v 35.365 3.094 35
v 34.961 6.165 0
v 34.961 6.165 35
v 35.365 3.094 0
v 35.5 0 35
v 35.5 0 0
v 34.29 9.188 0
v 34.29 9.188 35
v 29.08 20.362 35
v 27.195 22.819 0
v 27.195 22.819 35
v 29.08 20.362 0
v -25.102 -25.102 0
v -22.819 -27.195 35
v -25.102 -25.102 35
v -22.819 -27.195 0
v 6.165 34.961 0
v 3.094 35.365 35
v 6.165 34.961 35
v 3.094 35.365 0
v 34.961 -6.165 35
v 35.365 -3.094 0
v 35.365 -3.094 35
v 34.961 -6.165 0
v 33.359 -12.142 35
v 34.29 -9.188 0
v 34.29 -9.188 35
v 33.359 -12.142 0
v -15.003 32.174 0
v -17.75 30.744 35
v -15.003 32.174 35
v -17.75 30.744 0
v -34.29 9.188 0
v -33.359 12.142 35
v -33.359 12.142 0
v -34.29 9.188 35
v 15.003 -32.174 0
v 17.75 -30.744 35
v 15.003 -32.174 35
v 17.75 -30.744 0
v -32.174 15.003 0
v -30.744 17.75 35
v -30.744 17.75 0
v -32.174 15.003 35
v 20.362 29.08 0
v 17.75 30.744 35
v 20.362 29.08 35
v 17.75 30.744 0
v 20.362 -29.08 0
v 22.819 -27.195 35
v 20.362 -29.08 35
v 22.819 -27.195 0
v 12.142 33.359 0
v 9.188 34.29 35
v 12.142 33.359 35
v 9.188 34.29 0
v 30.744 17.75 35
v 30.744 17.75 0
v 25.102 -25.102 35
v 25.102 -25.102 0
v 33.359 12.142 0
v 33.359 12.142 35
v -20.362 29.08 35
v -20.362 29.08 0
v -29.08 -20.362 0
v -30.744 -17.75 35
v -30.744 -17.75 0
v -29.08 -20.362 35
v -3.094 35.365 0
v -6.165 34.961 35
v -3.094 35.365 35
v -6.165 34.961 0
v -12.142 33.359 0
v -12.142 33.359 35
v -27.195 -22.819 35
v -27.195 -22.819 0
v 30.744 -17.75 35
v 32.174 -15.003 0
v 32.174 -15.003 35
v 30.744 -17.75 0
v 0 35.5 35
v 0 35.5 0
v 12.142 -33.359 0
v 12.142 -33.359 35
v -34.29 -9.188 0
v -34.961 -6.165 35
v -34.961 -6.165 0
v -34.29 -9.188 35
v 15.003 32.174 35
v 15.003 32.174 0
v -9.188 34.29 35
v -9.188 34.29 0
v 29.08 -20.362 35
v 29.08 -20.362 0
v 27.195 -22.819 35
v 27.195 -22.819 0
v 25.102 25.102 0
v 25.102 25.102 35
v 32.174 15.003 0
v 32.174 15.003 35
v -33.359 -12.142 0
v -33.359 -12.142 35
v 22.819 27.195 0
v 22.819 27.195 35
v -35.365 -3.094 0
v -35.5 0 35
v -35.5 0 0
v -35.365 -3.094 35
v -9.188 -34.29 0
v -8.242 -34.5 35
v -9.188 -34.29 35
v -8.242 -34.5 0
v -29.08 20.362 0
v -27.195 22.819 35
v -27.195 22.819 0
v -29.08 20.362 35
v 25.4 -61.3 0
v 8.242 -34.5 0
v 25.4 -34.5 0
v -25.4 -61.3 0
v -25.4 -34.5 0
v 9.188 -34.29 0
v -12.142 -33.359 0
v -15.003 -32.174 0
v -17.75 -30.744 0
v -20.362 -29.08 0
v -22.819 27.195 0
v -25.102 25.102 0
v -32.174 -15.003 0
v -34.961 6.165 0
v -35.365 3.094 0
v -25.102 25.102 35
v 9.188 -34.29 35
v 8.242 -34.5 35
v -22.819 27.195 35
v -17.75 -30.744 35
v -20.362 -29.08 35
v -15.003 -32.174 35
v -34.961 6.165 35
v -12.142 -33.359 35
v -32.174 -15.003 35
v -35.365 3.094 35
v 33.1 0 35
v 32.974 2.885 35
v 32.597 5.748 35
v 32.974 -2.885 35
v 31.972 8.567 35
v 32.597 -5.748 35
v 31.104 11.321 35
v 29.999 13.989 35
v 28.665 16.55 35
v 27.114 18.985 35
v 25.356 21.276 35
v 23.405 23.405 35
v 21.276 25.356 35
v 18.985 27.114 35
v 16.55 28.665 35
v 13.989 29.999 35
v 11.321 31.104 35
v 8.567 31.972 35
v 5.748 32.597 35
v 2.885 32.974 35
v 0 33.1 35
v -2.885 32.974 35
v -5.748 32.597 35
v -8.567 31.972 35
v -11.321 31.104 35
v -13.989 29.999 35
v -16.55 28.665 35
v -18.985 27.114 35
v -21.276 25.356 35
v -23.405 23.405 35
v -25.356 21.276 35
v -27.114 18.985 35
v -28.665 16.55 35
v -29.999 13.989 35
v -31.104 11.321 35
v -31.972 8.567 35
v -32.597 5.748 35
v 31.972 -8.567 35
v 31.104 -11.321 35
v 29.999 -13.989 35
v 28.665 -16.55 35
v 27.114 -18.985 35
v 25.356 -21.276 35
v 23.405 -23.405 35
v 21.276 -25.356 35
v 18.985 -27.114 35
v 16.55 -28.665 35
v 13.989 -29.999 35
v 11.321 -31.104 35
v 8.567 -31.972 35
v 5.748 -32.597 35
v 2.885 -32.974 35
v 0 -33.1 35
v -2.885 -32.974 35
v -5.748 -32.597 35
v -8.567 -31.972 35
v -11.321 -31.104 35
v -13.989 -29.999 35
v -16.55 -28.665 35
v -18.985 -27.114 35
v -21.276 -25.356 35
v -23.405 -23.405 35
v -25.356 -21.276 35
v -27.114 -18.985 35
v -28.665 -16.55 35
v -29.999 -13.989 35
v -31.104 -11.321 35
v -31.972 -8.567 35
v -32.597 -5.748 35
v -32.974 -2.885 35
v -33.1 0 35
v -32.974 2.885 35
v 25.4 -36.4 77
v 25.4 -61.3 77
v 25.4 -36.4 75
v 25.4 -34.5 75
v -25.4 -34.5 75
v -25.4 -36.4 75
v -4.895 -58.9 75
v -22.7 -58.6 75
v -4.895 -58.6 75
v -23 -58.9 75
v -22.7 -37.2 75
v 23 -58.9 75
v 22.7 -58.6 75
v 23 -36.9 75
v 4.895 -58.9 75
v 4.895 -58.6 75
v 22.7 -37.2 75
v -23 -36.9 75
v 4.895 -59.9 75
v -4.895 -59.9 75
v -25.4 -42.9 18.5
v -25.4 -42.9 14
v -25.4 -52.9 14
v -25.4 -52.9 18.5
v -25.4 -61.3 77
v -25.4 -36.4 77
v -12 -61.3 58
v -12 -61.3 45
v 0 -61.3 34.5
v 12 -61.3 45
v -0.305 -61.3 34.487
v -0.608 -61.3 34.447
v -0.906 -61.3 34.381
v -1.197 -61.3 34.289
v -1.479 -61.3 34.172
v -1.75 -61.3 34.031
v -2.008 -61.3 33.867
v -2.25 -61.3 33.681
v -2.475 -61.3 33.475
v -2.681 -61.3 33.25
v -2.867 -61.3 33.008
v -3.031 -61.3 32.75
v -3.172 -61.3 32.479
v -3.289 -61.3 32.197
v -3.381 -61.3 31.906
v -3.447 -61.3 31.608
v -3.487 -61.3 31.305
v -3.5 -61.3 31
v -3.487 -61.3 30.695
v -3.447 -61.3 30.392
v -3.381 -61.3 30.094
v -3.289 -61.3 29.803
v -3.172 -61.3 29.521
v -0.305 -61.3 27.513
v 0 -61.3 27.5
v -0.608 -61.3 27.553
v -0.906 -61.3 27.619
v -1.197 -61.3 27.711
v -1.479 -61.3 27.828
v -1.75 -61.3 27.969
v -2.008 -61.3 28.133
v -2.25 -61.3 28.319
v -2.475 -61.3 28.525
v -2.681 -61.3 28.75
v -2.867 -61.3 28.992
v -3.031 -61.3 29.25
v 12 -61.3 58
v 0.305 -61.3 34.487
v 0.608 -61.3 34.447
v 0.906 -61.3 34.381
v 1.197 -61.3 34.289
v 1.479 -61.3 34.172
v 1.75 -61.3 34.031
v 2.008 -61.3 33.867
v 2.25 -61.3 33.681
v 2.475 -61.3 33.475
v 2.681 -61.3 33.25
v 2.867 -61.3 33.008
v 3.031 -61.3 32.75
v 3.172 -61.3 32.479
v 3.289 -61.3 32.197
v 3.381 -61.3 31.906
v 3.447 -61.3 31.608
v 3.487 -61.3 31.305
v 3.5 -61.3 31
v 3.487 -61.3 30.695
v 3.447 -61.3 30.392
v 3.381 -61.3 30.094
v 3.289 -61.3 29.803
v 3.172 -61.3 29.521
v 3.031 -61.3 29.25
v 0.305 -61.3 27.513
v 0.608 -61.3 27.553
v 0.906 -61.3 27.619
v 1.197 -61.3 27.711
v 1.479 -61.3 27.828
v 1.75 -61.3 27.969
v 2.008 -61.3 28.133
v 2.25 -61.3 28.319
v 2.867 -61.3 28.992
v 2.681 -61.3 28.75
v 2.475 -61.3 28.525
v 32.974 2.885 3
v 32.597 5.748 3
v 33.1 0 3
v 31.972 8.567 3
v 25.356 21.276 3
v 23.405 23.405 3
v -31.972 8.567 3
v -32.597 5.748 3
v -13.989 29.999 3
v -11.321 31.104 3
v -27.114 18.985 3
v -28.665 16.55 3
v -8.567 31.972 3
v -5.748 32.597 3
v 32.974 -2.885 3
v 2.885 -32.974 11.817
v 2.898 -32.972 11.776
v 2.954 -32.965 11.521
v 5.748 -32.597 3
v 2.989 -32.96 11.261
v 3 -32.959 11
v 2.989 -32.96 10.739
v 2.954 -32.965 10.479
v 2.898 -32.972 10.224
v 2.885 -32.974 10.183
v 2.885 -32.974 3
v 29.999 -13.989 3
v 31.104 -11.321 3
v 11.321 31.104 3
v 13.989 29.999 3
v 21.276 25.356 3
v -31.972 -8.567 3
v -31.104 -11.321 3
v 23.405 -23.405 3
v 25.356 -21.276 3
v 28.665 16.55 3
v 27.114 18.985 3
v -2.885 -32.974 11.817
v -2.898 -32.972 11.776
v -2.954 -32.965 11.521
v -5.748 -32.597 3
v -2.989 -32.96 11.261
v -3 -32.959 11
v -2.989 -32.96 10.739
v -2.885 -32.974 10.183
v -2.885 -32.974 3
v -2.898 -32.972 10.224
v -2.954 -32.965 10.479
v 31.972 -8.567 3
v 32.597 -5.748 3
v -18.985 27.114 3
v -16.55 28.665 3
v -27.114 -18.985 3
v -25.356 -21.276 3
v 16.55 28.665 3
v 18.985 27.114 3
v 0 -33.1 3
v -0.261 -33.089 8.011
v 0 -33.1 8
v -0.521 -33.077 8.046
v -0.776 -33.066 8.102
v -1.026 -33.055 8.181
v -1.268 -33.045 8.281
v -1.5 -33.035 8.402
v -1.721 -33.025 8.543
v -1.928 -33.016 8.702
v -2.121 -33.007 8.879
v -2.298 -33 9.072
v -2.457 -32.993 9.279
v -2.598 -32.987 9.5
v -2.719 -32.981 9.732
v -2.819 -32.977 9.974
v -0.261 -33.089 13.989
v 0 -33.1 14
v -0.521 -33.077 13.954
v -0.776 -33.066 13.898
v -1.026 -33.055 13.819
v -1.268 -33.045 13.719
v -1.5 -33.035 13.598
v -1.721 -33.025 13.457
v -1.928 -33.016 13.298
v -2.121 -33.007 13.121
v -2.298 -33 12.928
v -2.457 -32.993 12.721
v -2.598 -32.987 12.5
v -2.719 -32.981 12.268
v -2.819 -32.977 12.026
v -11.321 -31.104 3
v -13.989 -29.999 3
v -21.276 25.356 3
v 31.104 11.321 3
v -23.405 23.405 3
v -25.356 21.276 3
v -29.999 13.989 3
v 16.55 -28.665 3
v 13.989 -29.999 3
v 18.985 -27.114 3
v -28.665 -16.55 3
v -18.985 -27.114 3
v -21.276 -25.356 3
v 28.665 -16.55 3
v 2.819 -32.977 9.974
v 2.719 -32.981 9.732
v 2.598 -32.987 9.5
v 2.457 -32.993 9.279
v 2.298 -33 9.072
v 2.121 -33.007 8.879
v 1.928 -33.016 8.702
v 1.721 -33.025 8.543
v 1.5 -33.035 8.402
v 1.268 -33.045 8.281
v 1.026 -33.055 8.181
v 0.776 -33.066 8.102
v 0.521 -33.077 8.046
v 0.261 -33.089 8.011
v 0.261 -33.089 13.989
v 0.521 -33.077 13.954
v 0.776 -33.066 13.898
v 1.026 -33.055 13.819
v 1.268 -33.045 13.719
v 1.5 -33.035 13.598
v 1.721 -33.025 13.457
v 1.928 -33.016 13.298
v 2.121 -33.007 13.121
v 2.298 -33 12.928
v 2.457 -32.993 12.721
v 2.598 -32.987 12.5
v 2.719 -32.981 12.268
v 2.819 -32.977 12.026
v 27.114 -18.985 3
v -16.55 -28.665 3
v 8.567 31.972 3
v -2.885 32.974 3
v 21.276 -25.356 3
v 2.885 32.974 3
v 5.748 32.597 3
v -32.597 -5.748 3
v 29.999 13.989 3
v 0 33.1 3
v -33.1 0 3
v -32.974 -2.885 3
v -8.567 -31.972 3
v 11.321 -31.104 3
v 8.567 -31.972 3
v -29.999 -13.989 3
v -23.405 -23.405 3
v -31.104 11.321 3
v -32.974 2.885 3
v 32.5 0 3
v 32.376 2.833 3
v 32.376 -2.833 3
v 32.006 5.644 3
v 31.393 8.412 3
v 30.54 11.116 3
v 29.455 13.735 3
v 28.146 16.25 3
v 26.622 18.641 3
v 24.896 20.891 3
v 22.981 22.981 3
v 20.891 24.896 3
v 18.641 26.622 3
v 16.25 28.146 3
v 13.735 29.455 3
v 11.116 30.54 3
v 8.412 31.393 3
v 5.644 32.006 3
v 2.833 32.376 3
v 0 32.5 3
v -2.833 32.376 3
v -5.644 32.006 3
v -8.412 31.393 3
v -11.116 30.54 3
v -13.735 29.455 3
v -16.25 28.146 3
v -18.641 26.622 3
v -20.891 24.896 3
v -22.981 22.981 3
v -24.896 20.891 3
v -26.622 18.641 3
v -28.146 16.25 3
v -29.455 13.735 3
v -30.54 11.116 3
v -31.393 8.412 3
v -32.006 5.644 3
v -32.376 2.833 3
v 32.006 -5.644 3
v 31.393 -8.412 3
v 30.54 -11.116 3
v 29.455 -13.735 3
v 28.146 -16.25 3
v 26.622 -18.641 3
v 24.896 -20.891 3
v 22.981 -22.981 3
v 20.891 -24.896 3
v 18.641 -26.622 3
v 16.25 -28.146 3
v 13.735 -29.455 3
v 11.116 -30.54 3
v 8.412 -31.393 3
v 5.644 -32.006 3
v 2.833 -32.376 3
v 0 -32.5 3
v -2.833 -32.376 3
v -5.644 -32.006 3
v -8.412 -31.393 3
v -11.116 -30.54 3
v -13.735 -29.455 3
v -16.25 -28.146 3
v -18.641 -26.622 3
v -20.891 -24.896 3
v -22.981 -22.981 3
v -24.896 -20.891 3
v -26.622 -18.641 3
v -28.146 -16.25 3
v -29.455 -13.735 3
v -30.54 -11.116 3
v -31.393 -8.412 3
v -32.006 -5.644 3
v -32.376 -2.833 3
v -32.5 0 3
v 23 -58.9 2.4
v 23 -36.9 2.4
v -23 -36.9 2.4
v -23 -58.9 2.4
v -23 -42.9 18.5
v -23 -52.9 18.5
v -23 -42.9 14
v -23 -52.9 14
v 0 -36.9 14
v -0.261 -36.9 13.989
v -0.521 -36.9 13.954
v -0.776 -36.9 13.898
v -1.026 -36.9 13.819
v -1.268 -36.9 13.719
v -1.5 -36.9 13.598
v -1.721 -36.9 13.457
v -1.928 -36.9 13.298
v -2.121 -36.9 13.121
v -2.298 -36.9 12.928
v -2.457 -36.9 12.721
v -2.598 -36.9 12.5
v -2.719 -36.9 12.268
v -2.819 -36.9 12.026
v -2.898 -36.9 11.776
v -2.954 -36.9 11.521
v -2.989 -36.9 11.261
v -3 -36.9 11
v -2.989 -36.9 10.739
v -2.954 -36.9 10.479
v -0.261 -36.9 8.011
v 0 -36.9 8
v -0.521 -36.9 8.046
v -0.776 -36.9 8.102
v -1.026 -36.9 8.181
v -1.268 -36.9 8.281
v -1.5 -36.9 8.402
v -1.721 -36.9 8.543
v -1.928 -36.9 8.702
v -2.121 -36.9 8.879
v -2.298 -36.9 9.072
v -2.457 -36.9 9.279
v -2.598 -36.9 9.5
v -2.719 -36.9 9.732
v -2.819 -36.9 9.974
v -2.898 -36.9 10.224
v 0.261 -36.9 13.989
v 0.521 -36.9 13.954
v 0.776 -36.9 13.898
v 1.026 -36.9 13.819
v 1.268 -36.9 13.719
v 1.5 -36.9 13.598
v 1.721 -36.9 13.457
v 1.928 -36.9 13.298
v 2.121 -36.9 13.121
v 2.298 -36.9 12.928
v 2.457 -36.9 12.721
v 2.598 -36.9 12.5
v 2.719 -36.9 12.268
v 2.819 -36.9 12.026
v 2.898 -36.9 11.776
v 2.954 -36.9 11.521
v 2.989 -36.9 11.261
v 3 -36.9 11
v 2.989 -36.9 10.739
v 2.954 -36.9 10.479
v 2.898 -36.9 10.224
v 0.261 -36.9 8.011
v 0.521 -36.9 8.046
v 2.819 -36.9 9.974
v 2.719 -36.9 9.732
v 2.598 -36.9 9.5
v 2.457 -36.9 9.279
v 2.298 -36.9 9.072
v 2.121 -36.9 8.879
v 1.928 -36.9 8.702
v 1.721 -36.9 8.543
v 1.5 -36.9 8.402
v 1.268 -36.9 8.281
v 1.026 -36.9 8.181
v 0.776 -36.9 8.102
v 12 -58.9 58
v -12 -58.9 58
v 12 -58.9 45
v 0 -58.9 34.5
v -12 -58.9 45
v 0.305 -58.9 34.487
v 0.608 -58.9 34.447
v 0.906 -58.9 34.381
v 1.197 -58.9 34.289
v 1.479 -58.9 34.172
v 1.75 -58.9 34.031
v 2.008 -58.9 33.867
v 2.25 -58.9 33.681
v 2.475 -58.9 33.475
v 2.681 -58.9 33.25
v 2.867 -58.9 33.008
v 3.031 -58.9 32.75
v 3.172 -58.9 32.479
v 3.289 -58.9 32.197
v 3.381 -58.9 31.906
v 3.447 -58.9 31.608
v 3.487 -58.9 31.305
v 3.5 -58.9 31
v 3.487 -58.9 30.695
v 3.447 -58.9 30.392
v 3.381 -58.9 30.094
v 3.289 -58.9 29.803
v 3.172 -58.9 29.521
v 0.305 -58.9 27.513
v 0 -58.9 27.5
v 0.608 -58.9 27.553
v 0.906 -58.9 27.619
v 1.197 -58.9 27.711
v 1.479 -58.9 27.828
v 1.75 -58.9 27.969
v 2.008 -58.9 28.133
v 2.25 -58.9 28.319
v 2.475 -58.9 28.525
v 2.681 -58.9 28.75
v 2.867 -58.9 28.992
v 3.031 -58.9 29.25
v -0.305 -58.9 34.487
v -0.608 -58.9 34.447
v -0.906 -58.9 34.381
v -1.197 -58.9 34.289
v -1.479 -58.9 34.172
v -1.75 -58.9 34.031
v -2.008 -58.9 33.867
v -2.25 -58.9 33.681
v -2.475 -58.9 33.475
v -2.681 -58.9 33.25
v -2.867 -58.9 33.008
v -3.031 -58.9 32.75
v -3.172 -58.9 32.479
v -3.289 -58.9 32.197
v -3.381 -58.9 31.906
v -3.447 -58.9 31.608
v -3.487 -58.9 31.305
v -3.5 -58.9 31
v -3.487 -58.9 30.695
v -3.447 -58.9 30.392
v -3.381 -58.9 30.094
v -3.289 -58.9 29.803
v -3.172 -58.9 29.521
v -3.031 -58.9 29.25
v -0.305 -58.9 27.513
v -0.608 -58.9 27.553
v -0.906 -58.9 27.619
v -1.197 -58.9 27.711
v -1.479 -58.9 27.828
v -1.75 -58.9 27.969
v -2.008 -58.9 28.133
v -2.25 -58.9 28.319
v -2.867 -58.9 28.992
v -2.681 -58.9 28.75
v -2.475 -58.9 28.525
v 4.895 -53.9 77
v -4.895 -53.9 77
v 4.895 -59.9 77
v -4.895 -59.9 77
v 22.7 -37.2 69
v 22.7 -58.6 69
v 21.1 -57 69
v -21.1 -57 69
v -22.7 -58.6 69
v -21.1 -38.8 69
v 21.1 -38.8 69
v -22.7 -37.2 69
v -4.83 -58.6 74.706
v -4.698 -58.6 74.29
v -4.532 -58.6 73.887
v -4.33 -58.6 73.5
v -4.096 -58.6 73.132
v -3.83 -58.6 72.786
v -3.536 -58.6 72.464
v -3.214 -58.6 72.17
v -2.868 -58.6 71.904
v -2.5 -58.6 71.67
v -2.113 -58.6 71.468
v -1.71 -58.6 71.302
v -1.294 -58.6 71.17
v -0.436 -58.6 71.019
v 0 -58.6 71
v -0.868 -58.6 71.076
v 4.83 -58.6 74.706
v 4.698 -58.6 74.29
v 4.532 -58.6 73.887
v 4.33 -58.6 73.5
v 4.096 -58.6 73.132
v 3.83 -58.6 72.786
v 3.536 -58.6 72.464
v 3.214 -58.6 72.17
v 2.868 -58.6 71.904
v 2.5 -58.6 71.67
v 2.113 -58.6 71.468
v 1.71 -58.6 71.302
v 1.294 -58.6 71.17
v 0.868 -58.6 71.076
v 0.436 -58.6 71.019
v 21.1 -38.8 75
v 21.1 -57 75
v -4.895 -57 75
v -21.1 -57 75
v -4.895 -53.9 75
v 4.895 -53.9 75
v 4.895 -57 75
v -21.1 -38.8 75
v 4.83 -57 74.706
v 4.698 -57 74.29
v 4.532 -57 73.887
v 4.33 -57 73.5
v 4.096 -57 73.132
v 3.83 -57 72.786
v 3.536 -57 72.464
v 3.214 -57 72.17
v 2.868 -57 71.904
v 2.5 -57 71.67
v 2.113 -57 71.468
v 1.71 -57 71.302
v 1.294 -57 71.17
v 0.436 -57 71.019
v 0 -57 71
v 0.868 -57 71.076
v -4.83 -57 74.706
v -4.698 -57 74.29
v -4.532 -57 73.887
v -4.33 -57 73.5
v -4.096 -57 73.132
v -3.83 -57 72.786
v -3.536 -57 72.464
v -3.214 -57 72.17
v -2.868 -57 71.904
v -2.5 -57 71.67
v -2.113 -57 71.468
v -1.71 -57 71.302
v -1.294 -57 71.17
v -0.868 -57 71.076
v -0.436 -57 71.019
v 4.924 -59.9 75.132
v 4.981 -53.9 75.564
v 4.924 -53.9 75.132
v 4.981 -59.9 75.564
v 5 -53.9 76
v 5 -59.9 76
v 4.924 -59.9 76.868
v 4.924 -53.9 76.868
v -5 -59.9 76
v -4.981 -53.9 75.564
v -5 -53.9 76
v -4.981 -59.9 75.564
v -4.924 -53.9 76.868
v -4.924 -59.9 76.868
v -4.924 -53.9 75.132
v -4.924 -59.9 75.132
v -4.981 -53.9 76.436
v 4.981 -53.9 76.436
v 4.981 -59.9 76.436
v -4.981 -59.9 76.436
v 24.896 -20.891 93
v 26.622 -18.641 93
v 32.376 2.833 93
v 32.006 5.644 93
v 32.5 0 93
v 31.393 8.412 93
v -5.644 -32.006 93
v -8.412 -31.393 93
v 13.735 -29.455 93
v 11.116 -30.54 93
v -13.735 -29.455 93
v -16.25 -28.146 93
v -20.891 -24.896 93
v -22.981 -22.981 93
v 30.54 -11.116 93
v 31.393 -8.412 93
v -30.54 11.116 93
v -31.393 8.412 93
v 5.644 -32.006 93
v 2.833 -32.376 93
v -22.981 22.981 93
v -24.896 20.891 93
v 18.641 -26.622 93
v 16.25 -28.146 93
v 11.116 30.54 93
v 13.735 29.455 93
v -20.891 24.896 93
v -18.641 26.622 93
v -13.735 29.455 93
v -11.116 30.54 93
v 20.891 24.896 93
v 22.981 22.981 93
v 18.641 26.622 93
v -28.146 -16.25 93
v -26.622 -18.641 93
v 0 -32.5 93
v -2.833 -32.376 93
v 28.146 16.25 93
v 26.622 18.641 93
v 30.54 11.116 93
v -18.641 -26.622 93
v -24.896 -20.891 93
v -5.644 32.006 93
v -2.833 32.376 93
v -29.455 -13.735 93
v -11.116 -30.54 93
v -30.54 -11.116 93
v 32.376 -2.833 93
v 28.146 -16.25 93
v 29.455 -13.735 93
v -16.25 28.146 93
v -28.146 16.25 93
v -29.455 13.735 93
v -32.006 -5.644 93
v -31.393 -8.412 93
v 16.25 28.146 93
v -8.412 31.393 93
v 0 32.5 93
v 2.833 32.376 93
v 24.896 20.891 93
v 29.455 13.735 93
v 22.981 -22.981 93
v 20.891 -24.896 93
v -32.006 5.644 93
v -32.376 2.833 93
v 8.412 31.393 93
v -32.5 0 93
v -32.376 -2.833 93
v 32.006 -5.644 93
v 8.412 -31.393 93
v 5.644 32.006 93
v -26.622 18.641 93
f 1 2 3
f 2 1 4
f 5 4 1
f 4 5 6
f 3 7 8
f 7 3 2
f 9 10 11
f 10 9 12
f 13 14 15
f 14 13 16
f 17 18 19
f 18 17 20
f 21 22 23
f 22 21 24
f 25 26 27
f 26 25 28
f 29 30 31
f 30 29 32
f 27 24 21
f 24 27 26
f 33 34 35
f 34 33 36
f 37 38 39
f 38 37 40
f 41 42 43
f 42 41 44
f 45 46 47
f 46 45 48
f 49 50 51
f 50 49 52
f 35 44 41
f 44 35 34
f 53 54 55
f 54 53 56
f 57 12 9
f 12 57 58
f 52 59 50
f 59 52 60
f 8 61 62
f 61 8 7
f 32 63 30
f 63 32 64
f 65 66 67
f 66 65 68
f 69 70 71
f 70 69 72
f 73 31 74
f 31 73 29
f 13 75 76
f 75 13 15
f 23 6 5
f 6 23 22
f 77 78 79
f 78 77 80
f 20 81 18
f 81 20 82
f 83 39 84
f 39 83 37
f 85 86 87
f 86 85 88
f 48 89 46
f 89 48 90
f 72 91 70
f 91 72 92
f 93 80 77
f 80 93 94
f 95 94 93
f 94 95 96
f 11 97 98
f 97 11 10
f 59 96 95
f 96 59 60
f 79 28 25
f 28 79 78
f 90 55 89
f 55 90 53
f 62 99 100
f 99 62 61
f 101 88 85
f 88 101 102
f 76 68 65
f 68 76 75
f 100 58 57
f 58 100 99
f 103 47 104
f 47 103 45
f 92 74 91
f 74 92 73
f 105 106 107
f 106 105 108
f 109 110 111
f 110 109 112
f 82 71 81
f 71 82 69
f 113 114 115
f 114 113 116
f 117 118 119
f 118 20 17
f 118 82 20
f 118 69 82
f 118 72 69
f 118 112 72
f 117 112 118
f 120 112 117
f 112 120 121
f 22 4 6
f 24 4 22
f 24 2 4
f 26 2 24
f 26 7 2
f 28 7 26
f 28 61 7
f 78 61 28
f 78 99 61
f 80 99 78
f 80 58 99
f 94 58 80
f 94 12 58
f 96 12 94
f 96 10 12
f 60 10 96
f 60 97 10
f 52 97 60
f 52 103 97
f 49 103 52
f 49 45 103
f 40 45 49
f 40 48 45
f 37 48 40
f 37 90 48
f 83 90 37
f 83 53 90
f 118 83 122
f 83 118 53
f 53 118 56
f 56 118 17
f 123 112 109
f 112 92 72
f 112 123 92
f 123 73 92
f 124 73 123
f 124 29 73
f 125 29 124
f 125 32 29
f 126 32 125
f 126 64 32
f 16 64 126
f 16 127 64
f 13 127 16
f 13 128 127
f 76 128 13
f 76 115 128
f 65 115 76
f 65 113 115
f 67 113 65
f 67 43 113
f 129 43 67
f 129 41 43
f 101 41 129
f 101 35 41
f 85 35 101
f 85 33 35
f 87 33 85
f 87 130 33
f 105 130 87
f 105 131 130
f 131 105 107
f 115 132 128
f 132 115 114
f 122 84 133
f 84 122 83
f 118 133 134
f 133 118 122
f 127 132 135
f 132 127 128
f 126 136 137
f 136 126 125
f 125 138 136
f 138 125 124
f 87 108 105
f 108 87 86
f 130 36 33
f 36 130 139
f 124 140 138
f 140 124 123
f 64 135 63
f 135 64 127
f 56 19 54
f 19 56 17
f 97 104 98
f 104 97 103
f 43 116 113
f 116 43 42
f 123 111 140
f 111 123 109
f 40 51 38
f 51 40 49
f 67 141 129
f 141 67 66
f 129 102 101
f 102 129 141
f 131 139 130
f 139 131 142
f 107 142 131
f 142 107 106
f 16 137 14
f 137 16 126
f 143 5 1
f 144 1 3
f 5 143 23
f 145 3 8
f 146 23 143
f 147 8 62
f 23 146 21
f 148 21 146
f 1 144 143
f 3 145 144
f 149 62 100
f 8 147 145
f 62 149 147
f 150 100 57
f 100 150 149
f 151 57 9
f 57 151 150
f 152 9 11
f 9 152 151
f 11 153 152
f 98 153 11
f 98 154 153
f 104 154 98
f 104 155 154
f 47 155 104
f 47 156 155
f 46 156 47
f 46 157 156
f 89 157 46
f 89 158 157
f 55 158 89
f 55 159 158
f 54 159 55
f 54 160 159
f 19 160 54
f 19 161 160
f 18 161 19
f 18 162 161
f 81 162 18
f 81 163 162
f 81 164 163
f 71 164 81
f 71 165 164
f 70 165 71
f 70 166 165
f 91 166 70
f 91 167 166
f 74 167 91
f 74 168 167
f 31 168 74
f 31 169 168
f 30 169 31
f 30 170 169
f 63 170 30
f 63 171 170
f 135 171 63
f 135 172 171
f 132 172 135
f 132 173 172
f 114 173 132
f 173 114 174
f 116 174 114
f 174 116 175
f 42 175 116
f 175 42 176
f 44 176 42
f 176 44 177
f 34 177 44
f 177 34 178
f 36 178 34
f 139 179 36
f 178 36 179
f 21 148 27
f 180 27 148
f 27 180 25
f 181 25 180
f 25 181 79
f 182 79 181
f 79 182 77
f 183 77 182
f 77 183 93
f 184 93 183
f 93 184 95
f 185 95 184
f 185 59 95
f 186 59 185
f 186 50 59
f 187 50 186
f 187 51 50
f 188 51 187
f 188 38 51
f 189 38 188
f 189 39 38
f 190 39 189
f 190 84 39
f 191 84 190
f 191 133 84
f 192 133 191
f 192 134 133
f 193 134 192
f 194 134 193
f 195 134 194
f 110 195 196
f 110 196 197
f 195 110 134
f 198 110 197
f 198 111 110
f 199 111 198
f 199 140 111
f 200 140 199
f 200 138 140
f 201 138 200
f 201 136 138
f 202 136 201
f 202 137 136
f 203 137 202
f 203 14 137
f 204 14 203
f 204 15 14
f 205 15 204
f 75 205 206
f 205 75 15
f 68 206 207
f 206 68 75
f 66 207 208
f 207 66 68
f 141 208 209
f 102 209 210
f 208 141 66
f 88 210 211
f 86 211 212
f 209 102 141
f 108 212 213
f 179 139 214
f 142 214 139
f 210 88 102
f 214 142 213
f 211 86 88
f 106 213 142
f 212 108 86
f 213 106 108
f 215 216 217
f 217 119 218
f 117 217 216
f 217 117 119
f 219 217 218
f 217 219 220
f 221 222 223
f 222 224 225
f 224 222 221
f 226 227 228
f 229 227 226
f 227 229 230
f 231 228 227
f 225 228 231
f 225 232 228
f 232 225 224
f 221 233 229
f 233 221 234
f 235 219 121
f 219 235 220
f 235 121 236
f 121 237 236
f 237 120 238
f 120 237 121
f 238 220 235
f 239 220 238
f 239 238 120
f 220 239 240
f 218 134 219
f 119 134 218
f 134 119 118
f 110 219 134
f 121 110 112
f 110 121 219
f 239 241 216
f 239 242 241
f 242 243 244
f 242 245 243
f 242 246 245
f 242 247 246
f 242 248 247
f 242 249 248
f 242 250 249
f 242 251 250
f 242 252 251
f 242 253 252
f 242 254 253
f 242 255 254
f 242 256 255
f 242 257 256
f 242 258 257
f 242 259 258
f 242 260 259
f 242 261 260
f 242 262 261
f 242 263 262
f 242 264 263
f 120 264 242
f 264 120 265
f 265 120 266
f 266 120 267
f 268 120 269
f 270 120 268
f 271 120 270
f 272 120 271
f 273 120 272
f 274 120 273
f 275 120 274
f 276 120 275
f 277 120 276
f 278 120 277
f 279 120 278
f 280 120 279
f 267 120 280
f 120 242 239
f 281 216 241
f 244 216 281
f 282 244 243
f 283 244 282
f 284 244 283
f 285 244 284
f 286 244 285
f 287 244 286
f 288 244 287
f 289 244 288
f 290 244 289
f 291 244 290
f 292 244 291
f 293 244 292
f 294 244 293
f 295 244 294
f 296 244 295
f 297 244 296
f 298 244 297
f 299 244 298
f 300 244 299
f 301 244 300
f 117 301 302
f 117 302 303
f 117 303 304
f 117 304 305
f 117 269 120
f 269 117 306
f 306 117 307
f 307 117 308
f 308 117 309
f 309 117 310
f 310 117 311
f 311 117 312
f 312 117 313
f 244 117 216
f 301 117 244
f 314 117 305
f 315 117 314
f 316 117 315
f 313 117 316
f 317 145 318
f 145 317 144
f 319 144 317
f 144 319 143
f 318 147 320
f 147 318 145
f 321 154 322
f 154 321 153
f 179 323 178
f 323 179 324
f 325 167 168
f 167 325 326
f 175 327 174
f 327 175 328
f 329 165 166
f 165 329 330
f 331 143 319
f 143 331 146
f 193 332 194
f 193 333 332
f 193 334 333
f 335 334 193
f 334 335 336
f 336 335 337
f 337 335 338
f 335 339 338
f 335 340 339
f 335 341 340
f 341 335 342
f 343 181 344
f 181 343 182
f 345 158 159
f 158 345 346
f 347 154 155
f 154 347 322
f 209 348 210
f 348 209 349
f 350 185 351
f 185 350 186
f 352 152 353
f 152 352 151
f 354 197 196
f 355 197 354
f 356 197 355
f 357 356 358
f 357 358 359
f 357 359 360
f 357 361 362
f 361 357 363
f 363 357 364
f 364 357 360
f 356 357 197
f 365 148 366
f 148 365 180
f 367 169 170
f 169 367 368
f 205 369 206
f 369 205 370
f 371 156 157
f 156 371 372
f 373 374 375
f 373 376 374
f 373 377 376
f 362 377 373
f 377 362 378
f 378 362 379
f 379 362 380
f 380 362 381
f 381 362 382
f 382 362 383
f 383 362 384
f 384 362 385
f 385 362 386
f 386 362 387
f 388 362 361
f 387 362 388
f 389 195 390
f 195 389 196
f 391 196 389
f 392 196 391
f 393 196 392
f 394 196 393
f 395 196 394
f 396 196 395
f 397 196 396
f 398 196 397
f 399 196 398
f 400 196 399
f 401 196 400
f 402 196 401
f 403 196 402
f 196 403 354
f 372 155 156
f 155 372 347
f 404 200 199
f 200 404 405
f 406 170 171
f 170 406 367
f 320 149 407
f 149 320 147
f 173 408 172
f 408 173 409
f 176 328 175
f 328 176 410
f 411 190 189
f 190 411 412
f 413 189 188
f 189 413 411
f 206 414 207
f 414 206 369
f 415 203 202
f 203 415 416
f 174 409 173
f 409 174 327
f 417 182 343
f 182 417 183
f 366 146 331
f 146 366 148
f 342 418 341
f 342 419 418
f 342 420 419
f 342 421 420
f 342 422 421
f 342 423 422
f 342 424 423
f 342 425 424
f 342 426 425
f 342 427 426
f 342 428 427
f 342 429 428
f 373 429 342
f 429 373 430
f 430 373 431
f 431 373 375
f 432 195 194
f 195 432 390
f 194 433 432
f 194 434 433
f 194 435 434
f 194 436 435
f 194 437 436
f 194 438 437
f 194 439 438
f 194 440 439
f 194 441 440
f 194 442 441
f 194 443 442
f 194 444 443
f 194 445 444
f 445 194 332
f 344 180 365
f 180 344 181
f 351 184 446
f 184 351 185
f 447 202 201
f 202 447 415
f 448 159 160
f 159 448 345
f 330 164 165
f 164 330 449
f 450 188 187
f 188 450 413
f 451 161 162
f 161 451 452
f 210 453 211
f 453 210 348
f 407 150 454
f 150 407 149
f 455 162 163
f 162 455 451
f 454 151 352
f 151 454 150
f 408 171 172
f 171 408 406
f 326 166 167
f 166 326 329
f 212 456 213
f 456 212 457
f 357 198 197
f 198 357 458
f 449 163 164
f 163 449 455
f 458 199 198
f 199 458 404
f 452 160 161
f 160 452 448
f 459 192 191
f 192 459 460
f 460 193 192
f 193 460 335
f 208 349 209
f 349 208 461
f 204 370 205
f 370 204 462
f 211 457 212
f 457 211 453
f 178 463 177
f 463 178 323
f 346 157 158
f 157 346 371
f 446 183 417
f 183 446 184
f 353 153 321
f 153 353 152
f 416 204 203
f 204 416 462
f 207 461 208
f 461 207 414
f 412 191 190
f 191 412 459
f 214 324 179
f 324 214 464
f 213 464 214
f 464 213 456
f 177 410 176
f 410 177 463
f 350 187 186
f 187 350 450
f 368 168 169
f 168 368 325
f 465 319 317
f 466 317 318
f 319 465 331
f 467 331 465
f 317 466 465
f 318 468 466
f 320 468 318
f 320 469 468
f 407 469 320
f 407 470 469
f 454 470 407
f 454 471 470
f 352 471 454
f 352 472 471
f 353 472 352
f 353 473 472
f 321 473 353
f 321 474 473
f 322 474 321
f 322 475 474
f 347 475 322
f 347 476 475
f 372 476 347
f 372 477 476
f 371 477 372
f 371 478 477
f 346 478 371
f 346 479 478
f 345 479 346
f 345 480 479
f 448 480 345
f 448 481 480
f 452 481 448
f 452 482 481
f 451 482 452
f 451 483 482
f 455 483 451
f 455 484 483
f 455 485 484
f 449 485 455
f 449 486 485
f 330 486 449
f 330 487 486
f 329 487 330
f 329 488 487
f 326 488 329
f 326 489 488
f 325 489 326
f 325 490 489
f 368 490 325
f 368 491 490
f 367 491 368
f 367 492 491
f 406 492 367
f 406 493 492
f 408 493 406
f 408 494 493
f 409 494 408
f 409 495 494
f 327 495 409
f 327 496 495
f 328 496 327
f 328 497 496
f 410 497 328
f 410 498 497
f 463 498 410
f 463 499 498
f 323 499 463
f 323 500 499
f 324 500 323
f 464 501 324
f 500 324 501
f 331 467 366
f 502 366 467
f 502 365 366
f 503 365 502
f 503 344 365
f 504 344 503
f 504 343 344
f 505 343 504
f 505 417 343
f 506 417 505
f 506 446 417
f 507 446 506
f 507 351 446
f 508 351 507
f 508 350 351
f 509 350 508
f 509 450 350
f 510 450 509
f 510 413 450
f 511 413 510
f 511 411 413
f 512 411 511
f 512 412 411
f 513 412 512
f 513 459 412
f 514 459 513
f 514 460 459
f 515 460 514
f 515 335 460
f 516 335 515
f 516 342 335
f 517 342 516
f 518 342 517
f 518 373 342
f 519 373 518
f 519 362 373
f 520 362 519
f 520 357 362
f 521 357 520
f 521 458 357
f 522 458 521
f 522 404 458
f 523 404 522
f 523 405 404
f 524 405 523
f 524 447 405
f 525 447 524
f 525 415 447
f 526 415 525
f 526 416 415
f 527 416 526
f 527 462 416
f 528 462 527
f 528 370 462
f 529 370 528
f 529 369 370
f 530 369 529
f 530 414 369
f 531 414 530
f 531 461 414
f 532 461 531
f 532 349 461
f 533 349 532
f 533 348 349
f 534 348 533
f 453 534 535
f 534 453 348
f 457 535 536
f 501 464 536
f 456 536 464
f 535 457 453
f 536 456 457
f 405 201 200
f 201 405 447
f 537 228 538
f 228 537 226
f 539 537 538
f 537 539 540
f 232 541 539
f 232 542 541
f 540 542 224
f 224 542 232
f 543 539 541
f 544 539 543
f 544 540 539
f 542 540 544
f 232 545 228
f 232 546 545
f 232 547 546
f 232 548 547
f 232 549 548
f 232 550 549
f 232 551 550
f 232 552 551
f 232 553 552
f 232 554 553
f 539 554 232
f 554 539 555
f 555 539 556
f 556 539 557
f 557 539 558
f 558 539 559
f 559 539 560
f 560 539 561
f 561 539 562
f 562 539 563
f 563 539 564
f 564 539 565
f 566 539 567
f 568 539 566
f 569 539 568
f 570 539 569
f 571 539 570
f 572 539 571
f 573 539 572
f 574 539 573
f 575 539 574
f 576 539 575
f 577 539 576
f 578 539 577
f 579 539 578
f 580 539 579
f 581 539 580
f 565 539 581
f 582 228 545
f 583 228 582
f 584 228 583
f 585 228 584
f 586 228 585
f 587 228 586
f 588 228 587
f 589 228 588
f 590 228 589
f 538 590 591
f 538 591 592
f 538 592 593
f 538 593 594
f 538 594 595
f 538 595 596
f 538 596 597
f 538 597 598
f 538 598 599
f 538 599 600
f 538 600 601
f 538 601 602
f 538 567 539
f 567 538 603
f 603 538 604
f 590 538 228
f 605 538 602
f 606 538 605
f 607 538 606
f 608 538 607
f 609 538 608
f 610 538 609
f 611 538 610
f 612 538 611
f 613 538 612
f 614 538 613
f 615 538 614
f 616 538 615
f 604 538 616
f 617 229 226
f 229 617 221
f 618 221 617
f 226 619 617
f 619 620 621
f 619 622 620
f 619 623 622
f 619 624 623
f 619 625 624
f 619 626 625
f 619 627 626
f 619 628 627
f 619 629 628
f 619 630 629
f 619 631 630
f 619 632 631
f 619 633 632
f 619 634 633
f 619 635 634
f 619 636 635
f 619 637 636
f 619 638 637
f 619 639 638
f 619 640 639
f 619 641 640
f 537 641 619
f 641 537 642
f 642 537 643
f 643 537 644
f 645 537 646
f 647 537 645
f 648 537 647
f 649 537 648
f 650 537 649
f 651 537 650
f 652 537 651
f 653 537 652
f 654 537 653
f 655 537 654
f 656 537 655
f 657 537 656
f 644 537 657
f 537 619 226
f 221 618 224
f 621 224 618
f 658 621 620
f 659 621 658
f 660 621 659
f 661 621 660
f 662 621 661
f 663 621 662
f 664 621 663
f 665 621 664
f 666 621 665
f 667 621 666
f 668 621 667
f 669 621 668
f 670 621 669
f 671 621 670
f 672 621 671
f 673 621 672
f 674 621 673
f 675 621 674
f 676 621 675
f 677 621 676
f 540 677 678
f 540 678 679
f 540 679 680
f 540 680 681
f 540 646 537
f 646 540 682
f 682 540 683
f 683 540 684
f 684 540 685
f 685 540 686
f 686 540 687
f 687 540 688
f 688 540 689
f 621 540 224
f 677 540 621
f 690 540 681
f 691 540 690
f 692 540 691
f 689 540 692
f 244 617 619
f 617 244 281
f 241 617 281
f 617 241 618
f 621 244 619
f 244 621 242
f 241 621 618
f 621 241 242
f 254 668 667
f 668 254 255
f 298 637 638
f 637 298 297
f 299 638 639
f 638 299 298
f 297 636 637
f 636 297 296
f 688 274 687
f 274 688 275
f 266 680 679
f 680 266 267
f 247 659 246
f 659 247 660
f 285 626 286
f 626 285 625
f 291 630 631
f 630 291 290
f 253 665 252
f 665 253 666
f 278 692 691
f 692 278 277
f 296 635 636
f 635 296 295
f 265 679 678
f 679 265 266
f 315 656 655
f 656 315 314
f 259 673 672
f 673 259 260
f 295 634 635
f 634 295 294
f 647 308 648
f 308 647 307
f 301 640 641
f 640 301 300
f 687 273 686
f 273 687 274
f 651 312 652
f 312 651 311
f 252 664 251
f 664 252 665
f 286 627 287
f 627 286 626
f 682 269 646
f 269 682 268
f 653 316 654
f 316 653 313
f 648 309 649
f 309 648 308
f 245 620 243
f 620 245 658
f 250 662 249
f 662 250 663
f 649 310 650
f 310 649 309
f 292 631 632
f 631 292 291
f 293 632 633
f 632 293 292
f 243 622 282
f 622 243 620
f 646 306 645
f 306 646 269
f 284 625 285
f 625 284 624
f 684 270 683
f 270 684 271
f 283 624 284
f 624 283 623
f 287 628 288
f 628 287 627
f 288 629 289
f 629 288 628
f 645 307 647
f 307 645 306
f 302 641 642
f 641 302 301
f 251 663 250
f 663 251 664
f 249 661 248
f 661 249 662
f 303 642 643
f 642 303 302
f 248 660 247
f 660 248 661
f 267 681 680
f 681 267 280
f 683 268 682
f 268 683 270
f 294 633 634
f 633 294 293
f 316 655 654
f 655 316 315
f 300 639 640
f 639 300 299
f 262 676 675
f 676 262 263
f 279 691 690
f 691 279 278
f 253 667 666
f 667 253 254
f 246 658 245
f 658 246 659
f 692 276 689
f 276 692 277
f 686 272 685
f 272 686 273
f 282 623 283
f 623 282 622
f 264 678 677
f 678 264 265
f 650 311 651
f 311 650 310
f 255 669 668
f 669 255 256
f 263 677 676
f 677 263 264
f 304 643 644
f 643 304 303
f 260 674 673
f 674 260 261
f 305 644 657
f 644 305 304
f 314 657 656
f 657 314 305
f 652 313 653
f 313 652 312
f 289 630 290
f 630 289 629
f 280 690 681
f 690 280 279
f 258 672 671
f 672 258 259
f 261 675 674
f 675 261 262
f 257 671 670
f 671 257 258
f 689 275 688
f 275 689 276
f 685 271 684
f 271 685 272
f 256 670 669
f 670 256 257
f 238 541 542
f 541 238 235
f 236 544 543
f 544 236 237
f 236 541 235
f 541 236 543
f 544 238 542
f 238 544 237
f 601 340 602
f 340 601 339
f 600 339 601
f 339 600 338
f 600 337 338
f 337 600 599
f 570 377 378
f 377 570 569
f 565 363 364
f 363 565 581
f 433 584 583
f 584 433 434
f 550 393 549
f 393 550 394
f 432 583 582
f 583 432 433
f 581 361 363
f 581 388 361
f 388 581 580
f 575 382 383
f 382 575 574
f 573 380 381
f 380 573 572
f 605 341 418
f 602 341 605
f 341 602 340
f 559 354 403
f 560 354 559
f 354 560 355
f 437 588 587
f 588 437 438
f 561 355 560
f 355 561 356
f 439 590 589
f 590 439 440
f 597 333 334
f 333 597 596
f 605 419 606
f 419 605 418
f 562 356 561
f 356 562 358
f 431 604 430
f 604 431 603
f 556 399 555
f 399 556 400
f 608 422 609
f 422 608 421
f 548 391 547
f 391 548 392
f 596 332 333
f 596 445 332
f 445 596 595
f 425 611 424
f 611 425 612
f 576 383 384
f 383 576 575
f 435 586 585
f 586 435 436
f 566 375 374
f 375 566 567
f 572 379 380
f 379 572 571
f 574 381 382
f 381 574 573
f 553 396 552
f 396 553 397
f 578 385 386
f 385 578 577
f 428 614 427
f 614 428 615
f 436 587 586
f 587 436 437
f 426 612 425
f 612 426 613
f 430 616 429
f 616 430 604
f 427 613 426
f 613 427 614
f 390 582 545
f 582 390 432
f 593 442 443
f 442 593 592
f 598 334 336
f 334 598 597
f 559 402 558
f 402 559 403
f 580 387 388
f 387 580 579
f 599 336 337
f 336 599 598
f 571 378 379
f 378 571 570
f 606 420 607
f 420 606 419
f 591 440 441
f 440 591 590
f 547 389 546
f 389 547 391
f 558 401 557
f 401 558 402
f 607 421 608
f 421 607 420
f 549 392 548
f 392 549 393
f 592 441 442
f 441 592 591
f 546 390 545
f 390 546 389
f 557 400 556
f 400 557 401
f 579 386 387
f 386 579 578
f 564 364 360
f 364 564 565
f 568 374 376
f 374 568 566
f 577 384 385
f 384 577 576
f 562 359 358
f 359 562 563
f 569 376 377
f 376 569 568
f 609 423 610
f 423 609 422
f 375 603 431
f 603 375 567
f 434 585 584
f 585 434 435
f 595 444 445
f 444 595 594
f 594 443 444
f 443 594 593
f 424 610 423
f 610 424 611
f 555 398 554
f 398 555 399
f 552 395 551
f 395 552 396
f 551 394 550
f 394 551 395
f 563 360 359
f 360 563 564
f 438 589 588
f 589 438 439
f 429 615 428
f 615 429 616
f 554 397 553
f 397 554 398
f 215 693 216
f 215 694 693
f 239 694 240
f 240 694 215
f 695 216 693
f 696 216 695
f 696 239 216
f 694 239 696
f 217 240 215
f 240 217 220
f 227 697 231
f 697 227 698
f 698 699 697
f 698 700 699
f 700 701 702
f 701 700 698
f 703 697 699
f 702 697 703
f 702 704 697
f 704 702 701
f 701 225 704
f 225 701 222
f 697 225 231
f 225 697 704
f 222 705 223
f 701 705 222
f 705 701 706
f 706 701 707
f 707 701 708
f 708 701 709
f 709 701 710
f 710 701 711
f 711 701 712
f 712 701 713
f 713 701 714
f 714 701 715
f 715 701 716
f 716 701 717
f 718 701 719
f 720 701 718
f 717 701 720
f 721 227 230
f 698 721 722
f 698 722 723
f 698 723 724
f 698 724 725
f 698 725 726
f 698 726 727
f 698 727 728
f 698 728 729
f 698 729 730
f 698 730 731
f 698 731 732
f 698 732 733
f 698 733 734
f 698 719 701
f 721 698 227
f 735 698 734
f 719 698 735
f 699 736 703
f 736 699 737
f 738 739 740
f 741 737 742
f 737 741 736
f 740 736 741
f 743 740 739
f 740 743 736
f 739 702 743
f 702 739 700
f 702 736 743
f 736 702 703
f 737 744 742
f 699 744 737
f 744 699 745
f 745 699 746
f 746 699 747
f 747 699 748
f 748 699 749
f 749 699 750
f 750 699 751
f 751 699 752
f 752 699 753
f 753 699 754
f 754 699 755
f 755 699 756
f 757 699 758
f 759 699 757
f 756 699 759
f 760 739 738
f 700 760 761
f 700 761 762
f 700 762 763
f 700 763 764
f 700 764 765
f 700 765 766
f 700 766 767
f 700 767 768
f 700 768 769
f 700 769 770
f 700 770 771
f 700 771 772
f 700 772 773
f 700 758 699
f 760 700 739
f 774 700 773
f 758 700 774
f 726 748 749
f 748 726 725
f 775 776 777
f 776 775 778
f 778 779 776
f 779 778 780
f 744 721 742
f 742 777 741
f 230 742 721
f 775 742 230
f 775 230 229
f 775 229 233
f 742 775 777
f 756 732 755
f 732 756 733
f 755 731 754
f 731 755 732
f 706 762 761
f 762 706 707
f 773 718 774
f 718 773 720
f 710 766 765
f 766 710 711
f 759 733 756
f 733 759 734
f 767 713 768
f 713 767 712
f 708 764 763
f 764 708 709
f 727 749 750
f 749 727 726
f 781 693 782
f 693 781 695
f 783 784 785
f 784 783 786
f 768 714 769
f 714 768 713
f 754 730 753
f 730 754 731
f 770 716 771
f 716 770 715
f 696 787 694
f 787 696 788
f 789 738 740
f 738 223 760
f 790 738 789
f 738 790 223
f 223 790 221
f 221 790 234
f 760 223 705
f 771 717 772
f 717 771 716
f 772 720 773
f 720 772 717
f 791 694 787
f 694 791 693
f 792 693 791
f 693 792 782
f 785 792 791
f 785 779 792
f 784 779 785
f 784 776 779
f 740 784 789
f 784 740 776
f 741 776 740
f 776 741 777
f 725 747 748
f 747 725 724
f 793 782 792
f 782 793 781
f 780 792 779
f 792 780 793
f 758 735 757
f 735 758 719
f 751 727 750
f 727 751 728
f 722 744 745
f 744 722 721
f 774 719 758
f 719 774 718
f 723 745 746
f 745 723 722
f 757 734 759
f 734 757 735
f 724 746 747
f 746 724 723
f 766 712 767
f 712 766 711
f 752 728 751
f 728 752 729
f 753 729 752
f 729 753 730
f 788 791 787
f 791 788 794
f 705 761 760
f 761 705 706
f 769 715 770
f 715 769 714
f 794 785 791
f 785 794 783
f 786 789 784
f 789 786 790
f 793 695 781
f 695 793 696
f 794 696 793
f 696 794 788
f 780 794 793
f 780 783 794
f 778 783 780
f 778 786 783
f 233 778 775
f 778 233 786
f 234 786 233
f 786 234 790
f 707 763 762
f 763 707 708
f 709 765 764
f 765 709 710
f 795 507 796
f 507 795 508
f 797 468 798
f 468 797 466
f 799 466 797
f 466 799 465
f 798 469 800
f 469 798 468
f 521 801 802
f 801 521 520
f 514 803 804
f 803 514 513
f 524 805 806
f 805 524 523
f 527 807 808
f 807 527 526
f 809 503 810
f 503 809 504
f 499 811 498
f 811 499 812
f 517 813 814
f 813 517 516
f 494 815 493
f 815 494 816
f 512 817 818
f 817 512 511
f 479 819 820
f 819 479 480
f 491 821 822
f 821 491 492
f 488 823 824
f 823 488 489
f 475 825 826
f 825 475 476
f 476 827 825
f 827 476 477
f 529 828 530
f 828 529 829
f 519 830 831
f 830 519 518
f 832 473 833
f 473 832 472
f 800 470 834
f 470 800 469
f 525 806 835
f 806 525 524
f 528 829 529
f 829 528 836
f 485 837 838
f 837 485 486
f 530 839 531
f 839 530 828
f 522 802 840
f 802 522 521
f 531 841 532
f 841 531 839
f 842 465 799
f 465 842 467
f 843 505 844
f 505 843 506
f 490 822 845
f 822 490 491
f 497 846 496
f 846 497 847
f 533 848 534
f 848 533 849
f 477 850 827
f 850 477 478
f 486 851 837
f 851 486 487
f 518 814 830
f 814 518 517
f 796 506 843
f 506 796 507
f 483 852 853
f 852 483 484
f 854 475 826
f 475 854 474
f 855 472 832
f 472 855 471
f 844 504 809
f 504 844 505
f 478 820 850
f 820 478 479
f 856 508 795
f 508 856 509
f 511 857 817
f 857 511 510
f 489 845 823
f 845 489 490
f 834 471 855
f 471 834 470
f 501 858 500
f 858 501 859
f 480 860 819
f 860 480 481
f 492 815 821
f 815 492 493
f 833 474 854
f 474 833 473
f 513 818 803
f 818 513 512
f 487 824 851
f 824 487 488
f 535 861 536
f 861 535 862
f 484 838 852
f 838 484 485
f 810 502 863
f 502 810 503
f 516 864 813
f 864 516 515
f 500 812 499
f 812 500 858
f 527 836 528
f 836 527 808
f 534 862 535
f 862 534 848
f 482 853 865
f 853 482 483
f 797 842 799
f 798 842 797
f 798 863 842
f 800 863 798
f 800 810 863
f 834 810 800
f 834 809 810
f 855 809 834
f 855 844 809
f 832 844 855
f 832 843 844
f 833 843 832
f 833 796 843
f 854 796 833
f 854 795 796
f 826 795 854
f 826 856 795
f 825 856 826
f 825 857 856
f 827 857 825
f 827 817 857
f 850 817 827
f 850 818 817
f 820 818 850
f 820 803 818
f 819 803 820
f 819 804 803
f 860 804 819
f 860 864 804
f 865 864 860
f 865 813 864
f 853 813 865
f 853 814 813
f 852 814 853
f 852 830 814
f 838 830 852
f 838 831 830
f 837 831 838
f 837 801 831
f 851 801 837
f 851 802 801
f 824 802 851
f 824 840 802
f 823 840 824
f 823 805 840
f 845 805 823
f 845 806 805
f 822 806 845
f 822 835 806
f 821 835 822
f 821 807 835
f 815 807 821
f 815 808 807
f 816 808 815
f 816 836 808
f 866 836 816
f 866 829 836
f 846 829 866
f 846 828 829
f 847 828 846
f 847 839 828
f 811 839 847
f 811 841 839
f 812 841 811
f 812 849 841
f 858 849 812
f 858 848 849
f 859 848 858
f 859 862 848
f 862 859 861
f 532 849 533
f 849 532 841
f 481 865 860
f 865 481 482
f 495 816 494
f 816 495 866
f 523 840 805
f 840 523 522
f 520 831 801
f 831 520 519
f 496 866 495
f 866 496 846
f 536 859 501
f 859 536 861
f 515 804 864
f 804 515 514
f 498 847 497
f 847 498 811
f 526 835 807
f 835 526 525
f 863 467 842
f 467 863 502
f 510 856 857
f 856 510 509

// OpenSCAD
// ============================================================================
//  Prototipo de banco v0.1 · electrónica + botella · OpenSCAD
//
//  Sirve para montar y probar la electrónica de la v0.1 (XIAO ESP32-C3, MS4525DO,
//  OLED de 0,96", botón y batería) sin imprimir la cámara, la ranura, el canal de
//  descarga ni el buzo. En su lugar, una botella pequeña hace de depósito: la
//  presión de su fondo llega al sensor por un tubo de silicona, igual que en el
//  aparato real.
//
//  Coincide con la v0.1 en lo que importa para la electrónica:
//    · la caja tiene el mismo interior (46 × 22 mm) y las mismas aberturas
//      (ventana de la OLED, botón y USB-C lateral);
//    · los ejes son los mismos (Z arriba, ranura hacia +X, electrónica hacia -Y);
//    · el eje de la botella ocupa el sitio del eje de la cámara.
//
//  Piezas: cuerpo (caja + anillo para la botella) y caja_tapa.
//  Para exportar: elige "pieza", pulsa F6 y luego "Exportar como STL". PETG o PLA.
//  z = 0 es la cara inferior del cuerpo.
// ============================================================================

pieza = "todo"; // [todo, cuerpo, caja_tapa]

/* [Botella] */
botella_d = 65;    // diámetro exterior de la botella: MÍDELO y ajústalo
holgura   = 0.6;   // juego entre botella y anillo
anillo_h  = 35;    // altura del anillo que sujeta la botella
suelo     = 3;     // espesor del fondo del anillo
tubo_z    = 8;     // altura del paso del tubo sobre el fondo del anillo (taladra la botella a esta altura)
tubo_d    = 6;     // paso del tubo de silicona de 3 mm interior

/* [Electrónica] (igual que cad/uroflujometro.scad) */
caja_ancho = 46;   // interior en X
caja_fondo = 22;   // interior en Y
caja_alto  = 75;   // exterior en Z (la del aparato real mide 137: aquí sobra espacio)
pared      = 2.4;

$fn = 72;
e = 0.01;

Rb      = botella_d / 2 + holgura;   // radio interior del anillo
Re      = Rb + pared;                // radio exterior del anillo
y_caja0 = -(Re - 1);                 // cara trasera de la caja (solapa 1 mm con el anillo)
y_cin   = y_caja0 - pared;           // interior de la caja, atrás
y_cfin  = y_cin - caja_fondo;        // interior de la caja, delante
y_cext  = y_cfin - pared;            // cara frontal

// ------------------------------------------------------------------ cuerpo --
module cuerpo() {
  difference() {
    union() {
      cylinder(r = Re, h = anillo_h);
      translate([-caja_ancho / 2 - pared, y_cext, 0])
        cube([caja_ancho + 2 * pared, y_caja0 - y_cext, caja_alto]);
    }
    // hueco de la botella
    translate([0, 0, suelo]) cylinder(r = Rb, h = anillo_h);
    // interior de la caja (abierta por arriba; la cierra caja_tapa)
    translate([-caja_ancho / 2, y_cfin, pared]) cube([caja_ancho, caja_fondo, caja_alto]);
    // ventana de la OLED y botón (cara frontal, -Y)
    translate([-12, y_cext - 1, caja_alto - 30]) cube([24, pared + 2, 13]);
    translate([0, y_cfin + 1, caja_alto - 44]) rotate([90, 0, 0]) cylinder(d = 7, h = pared + 2);
    // USB-C de carga (lateral -X, abajo)
    translate([-caja_ancho / 2 - pared - 1, y_cfin + caja_fondo / 2 - 5, 14]) cube([pared + 2, 10, 4.5]);
    // paso del tubo de la toma de presión: de la caja al fondo de la botella
    translate([0, y_cin - 2, suelo + tubo_z]) rotate([-90, 0, 0]) cylinder(d = tubo_d, h = (y_cin - 2 < -Rb ? -Rb - (y_cin - 2) + 1 : 1));
  }
}

// ---------------------------------------------------------- tapa de la caja --
module caja_tapa() {
  difference() {
    union() {
      translate([-caja_ancho / 2 - pared, y_cext, 0]) cube([caja_ancho + 2 * pared, (y_cin + 0.5) - y_cext, 2]);
      translate([-caja_ancho / 2 + 0.3, y_cfin + 0.3, -6]) cube([caja_ancho - 0.6, caja_fondo - 0.6, 6 + e]);
    }
    translate([-caja_ancho / 2 + 1.9, y_cfin + 1.9, -7]) cube([caja_ancho - 3.8, caja_fondo - 3.8, 7]);
    translate([0, y_cfin - 1, 1]) rotate([-90, 0, 0]) cylinder(d = 10, h = 6);   // muesca para abrir
  }
}

// ------------------------------------------------------------------ montaje --
module montaje() {
  color("dimgray") cuerpo();
  color("dimgray") translate([0, 0, caja_alto]) caja_tapa();
  color("skyblue", 0.35) translate([0, 0, suelo]) cylinder(d = botella_d, h = 90);   // botella (solo para verla)
}

if (pieza == "todo")      montaje();
if (pieza == "cuerpo")    cuerpo();
if (pieza == "caja_tapa") rotate([180, 0, 0]) caja_tapa();   // placa abajo
